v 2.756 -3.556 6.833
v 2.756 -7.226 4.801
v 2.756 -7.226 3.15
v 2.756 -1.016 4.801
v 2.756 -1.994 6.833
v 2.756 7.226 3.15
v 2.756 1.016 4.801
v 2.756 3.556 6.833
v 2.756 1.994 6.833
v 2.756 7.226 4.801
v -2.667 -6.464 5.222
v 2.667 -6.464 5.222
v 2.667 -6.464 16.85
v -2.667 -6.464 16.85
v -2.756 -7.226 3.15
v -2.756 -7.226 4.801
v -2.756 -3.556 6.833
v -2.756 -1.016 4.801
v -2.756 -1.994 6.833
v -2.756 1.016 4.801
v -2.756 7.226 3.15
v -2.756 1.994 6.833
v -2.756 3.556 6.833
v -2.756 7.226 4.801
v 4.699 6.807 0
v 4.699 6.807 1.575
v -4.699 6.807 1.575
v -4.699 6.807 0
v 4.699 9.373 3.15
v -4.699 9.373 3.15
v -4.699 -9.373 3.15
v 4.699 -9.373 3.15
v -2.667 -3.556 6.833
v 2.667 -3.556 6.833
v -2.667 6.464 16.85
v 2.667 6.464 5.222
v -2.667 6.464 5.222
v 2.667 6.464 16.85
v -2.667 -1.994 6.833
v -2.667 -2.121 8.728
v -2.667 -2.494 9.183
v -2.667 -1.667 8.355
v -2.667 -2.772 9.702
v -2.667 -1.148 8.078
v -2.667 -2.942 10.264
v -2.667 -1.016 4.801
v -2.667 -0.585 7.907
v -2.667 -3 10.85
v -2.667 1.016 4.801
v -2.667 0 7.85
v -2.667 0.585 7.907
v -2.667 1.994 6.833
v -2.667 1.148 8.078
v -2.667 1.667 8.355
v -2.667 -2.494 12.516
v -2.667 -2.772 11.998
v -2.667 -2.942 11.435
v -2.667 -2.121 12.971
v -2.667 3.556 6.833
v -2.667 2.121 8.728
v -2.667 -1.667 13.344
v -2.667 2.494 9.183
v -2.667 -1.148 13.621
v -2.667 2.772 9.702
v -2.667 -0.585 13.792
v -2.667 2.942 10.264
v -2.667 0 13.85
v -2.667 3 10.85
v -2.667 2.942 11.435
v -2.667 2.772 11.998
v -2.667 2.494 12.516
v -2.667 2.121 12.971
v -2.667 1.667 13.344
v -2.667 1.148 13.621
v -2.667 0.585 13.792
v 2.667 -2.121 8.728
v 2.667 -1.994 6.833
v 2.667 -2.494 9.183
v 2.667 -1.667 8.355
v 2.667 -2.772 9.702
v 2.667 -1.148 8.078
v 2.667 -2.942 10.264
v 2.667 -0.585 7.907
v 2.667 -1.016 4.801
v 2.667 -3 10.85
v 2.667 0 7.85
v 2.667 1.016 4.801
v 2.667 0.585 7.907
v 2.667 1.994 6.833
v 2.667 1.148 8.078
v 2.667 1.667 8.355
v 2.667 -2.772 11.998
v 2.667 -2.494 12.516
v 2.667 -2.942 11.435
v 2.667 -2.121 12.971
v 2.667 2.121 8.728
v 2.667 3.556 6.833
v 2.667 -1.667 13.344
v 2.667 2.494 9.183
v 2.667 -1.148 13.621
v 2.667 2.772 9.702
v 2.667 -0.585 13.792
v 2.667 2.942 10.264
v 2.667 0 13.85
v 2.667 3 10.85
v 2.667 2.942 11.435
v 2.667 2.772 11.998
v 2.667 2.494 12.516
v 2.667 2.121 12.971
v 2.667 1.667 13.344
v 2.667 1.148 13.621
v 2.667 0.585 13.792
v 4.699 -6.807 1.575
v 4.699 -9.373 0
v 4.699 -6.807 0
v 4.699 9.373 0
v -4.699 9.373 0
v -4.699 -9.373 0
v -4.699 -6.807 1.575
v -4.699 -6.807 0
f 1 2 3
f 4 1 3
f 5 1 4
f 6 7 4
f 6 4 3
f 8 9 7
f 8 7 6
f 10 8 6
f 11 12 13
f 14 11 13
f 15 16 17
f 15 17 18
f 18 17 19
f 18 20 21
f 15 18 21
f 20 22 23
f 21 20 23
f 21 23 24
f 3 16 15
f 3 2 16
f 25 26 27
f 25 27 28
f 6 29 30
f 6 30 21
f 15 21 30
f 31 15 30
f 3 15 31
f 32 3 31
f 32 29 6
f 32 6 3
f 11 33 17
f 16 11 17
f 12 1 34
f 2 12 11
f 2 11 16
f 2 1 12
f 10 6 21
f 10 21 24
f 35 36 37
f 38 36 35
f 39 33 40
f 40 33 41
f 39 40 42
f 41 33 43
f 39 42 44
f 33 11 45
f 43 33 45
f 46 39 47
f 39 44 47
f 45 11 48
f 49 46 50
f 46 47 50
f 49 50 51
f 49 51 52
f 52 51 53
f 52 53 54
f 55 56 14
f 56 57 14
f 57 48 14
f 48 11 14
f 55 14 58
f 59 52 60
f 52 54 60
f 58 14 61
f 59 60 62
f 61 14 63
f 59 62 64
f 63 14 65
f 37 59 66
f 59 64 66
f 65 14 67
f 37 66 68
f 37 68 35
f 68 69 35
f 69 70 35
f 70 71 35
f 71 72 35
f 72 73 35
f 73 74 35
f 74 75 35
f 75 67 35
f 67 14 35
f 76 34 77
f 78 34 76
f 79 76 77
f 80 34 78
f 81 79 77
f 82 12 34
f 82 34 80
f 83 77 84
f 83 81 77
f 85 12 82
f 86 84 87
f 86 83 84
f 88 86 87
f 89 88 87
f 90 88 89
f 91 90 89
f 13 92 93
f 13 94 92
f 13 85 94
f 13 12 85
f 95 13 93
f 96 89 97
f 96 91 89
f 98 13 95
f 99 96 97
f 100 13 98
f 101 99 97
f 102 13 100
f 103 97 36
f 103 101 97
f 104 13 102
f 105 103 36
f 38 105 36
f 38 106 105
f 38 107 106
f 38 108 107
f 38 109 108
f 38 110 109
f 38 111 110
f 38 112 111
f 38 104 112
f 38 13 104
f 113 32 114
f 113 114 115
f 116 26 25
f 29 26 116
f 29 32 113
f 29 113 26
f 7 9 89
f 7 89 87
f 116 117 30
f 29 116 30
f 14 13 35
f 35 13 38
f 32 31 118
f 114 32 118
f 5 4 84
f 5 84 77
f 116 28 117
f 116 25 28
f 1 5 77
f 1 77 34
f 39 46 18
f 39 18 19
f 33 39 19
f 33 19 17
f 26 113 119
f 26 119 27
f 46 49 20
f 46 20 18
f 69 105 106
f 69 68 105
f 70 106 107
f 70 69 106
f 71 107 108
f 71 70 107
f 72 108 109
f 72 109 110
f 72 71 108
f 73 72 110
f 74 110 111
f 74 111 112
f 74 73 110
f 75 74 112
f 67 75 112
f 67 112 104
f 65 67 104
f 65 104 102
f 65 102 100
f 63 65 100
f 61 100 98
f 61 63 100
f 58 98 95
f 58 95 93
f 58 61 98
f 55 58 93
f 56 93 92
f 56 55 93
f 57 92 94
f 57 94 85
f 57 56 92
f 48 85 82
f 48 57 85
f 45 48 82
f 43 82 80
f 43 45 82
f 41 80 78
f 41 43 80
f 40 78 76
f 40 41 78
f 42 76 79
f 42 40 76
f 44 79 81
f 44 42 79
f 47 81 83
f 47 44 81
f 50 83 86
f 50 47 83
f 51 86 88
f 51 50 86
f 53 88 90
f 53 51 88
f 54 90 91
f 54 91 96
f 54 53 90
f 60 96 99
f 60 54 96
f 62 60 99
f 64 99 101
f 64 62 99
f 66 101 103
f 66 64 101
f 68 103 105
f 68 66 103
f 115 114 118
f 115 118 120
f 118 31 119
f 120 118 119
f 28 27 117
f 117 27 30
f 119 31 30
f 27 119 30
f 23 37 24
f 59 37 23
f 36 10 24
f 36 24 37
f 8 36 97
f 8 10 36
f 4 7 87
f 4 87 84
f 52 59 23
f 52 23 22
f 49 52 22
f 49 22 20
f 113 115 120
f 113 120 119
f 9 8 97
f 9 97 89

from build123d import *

# Parameters (mm, degrees)
F1_DEPTH = 4.699
F3_DEPTH = 2.7559
F4_W     = 12.9286
F4_H     = 13.7
F4_R     = 3
F5_DEPTH = 2.667


with BuildPart() as f1:
    # F0 (on Right) → F1 (new body, symmetric)
    with BuildSketch(Plane.YZ):
        Polygon((9.3726, 3.1496), (-9.3726, 3.1496), (-9.3726, 0), (-6.8072, 0), (-6.8072, 1.5748), (6.8072, 1.5748), (6.8072, 0), (9.3726, 0), align=None)
    extrude(amount=F1_DEPTH, both=True)

    # F2 (on Right) → F3 (join, symmetric)
    with BuildSketch(Plane.YZ):
        Polygon((-7.2263, 4.8006), (-7.2263, 3.1496), (7.2263, 3.1496), (7.2263, 4.8006), (3.556, 6.8326), (1.9939, 6.8326), (1.016, 4.8006), (0, 4.8006), (-1.016, 4.8006), (-1.9939, 6.8326), (-3.556, 6.8326), align=None)
    extrude(amount=F3_DEPTH, both=True)

    # F4 (on Right) → F5 (join, symmetric)
    with BuildSketch(Plane.YZ):
        with Locations((0, 9.9996)):
            Rectangle(F4_W, F4_H)
        with Locations((0, 10.8496)):
            Circle(F4_R, mode=Mode.SUBTRACT)
    extrude(amount=F5_DEPTH, both=True)


solid = f1.part
